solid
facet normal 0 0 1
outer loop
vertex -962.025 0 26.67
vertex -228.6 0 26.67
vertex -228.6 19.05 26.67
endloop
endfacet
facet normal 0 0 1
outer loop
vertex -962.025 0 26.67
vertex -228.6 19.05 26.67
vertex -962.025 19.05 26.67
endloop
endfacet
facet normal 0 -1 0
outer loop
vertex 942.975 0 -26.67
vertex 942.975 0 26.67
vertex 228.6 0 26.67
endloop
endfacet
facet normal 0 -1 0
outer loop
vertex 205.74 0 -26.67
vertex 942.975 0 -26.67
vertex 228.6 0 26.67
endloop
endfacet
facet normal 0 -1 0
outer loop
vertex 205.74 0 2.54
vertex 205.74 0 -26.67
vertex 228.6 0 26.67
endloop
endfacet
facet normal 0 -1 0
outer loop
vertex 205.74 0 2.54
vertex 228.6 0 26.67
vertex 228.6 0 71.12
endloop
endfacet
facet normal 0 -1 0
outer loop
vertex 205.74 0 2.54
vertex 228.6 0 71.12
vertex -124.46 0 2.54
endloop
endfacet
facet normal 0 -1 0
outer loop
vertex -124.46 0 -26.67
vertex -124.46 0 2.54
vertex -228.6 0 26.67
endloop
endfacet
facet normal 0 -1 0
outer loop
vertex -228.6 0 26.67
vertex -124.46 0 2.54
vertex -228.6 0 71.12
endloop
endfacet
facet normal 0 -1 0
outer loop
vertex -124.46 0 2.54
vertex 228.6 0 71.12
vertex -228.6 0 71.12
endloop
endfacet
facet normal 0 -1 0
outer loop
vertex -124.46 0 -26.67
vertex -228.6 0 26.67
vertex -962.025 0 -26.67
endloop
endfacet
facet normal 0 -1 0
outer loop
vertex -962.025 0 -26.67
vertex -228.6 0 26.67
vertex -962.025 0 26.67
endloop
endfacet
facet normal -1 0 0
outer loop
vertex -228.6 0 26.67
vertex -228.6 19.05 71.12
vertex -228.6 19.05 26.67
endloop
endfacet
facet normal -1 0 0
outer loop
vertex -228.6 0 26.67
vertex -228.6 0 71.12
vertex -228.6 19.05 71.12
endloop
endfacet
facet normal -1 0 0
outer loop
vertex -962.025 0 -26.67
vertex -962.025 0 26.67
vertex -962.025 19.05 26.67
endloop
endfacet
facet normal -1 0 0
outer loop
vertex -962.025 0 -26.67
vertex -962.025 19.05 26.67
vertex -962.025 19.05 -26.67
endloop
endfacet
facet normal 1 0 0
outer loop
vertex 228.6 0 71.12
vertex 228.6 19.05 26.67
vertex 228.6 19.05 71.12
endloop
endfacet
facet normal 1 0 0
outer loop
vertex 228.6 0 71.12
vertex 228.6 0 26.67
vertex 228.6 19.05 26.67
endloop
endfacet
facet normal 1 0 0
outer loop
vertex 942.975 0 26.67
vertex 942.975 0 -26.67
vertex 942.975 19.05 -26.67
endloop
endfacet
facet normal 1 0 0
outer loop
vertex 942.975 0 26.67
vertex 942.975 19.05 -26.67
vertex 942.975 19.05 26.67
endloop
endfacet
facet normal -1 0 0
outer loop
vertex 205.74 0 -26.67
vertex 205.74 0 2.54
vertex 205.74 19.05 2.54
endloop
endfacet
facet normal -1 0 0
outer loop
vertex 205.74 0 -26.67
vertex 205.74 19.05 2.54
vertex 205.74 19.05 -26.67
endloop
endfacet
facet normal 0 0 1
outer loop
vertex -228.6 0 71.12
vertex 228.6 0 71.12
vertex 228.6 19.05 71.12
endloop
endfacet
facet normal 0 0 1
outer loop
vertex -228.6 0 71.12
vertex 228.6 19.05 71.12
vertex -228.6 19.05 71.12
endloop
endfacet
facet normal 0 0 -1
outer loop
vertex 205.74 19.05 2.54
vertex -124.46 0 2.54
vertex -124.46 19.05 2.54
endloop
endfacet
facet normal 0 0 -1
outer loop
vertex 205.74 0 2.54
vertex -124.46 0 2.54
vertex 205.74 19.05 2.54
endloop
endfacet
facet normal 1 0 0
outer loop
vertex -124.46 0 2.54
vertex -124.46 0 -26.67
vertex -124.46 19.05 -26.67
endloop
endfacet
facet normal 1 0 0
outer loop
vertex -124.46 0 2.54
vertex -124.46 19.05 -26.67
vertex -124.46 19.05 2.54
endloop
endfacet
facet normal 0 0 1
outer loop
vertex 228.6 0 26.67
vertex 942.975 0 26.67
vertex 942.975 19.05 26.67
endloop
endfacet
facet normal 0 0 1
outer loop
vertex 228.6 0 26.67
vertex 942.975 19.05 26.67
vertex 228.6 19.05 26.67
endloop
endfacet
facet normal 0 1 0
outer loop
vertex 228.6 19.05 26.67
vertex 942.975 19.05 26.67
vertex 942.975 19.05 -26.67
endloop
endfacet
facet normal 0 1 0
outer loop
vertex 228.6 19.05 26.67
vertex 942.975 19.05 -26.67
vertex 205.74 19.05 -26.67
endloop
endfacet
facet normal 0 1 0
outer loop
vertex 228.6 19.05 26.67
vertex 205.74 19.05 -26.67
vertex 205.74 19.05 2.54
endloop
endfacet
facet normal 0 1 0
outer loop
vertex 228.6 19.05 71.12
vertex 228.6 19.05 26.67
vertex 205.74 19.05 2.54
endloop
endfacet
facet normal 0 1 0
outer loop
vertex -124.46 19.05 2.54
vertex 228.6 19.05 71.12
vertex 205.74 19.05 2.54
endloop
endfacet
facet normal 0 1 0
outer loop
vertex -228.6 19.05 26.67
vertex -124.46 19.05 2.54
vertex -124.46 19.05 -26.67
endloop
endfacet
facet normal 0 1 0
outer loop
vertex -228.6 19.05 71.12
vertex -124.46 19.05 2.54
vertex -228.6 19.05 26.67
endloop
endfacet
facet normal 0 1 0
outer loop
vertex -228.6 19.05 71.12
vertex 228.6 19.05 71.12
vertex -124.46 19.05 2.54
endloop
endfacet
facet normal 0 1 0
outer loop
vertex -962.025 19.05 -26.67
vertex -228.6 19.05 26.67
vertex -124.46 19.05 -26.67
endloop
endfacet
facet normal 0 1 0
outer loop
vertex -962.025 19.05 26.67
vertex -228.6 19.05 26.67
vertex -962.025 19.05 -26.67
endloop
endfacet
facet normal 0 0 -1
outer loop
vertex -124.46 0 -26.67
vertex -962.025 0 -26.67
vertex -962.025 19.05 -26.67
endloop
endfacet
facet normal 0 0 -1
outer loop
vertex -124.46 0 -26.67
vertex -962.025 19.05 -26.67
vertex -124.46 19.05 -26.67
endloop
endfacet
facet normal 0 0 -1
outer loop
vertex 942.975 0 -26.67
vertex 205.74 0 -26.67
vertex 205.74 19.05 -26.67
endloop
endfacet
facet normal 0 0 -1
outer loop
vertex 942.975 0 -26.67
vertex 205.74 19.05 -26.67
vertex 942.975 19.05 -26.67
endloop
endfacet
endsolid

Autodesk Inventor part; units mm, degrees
ref_plane "YZ Plane" through (0, 0, 0) normal (1, 0, 0) x (0, 1, 0)
ref_plane "XZ Plane" through (0, 0, 0) normal (0, 1, 0) x (-1, 0, 0)
ref_plane "XY Plane" through (0, 0, 0) normal (0, 0, 1) x (1, 0, 0)
sketch "Sketch1" plane through (0, 0, 0) normal (0, 1, 0) x (-1, 0, 0)
  line L0 (-942.975, -26.67) -> (-942.975, 26.67)
  line L1 (-942.975, 26.67) -> (-228.6, 26.67)
  line L2 (-228.6, 26.67) -> (-228.6, 71.12)
  line L3 (-228.6, 71.12) -> (228.6, 71.12)
  line L4 (228.6, 71.12) -> (228.6, 26.67)
  line L5 (228.6, 26.67) -> (962.025, 26.67)
  line L6 (962.025, 26.67) -> (962.025, -26.67)
  line L7 (962.025, -26.67) -> (124.46, -26.67)
  line L8 (124.46, -26.67) -> (124.46, 2.54)
  line L9 (124.46, 2.54) -> (-205.74, 2.54)
  line L10 (-205.74, 2.54) -> (-205.74, -26.67)
  line L11 (-205.74, -26.67) -> (-942.975, -26.67)
  point P0 (0, 0)
  point P1 (-942.975, 0)
  point P2 (0, 71.12)
  dimension "d0" = 1905
  dimension "d1" = 53.34
  dimension "d2" = 53.34
  dimension "d3" = 68.58
  dimension "d4" = 22.86
  dimension "d5" = 104.14
  dimension "d6" = 29.21
  dimension "d7" = 457.2
  dimension "d8" = 714.375
extrude "Extrusion1" add sketch "Sketch1" along normal blind 19.05
equation "\"d2\" = d1"
properties part number "radialArmSawFence"
